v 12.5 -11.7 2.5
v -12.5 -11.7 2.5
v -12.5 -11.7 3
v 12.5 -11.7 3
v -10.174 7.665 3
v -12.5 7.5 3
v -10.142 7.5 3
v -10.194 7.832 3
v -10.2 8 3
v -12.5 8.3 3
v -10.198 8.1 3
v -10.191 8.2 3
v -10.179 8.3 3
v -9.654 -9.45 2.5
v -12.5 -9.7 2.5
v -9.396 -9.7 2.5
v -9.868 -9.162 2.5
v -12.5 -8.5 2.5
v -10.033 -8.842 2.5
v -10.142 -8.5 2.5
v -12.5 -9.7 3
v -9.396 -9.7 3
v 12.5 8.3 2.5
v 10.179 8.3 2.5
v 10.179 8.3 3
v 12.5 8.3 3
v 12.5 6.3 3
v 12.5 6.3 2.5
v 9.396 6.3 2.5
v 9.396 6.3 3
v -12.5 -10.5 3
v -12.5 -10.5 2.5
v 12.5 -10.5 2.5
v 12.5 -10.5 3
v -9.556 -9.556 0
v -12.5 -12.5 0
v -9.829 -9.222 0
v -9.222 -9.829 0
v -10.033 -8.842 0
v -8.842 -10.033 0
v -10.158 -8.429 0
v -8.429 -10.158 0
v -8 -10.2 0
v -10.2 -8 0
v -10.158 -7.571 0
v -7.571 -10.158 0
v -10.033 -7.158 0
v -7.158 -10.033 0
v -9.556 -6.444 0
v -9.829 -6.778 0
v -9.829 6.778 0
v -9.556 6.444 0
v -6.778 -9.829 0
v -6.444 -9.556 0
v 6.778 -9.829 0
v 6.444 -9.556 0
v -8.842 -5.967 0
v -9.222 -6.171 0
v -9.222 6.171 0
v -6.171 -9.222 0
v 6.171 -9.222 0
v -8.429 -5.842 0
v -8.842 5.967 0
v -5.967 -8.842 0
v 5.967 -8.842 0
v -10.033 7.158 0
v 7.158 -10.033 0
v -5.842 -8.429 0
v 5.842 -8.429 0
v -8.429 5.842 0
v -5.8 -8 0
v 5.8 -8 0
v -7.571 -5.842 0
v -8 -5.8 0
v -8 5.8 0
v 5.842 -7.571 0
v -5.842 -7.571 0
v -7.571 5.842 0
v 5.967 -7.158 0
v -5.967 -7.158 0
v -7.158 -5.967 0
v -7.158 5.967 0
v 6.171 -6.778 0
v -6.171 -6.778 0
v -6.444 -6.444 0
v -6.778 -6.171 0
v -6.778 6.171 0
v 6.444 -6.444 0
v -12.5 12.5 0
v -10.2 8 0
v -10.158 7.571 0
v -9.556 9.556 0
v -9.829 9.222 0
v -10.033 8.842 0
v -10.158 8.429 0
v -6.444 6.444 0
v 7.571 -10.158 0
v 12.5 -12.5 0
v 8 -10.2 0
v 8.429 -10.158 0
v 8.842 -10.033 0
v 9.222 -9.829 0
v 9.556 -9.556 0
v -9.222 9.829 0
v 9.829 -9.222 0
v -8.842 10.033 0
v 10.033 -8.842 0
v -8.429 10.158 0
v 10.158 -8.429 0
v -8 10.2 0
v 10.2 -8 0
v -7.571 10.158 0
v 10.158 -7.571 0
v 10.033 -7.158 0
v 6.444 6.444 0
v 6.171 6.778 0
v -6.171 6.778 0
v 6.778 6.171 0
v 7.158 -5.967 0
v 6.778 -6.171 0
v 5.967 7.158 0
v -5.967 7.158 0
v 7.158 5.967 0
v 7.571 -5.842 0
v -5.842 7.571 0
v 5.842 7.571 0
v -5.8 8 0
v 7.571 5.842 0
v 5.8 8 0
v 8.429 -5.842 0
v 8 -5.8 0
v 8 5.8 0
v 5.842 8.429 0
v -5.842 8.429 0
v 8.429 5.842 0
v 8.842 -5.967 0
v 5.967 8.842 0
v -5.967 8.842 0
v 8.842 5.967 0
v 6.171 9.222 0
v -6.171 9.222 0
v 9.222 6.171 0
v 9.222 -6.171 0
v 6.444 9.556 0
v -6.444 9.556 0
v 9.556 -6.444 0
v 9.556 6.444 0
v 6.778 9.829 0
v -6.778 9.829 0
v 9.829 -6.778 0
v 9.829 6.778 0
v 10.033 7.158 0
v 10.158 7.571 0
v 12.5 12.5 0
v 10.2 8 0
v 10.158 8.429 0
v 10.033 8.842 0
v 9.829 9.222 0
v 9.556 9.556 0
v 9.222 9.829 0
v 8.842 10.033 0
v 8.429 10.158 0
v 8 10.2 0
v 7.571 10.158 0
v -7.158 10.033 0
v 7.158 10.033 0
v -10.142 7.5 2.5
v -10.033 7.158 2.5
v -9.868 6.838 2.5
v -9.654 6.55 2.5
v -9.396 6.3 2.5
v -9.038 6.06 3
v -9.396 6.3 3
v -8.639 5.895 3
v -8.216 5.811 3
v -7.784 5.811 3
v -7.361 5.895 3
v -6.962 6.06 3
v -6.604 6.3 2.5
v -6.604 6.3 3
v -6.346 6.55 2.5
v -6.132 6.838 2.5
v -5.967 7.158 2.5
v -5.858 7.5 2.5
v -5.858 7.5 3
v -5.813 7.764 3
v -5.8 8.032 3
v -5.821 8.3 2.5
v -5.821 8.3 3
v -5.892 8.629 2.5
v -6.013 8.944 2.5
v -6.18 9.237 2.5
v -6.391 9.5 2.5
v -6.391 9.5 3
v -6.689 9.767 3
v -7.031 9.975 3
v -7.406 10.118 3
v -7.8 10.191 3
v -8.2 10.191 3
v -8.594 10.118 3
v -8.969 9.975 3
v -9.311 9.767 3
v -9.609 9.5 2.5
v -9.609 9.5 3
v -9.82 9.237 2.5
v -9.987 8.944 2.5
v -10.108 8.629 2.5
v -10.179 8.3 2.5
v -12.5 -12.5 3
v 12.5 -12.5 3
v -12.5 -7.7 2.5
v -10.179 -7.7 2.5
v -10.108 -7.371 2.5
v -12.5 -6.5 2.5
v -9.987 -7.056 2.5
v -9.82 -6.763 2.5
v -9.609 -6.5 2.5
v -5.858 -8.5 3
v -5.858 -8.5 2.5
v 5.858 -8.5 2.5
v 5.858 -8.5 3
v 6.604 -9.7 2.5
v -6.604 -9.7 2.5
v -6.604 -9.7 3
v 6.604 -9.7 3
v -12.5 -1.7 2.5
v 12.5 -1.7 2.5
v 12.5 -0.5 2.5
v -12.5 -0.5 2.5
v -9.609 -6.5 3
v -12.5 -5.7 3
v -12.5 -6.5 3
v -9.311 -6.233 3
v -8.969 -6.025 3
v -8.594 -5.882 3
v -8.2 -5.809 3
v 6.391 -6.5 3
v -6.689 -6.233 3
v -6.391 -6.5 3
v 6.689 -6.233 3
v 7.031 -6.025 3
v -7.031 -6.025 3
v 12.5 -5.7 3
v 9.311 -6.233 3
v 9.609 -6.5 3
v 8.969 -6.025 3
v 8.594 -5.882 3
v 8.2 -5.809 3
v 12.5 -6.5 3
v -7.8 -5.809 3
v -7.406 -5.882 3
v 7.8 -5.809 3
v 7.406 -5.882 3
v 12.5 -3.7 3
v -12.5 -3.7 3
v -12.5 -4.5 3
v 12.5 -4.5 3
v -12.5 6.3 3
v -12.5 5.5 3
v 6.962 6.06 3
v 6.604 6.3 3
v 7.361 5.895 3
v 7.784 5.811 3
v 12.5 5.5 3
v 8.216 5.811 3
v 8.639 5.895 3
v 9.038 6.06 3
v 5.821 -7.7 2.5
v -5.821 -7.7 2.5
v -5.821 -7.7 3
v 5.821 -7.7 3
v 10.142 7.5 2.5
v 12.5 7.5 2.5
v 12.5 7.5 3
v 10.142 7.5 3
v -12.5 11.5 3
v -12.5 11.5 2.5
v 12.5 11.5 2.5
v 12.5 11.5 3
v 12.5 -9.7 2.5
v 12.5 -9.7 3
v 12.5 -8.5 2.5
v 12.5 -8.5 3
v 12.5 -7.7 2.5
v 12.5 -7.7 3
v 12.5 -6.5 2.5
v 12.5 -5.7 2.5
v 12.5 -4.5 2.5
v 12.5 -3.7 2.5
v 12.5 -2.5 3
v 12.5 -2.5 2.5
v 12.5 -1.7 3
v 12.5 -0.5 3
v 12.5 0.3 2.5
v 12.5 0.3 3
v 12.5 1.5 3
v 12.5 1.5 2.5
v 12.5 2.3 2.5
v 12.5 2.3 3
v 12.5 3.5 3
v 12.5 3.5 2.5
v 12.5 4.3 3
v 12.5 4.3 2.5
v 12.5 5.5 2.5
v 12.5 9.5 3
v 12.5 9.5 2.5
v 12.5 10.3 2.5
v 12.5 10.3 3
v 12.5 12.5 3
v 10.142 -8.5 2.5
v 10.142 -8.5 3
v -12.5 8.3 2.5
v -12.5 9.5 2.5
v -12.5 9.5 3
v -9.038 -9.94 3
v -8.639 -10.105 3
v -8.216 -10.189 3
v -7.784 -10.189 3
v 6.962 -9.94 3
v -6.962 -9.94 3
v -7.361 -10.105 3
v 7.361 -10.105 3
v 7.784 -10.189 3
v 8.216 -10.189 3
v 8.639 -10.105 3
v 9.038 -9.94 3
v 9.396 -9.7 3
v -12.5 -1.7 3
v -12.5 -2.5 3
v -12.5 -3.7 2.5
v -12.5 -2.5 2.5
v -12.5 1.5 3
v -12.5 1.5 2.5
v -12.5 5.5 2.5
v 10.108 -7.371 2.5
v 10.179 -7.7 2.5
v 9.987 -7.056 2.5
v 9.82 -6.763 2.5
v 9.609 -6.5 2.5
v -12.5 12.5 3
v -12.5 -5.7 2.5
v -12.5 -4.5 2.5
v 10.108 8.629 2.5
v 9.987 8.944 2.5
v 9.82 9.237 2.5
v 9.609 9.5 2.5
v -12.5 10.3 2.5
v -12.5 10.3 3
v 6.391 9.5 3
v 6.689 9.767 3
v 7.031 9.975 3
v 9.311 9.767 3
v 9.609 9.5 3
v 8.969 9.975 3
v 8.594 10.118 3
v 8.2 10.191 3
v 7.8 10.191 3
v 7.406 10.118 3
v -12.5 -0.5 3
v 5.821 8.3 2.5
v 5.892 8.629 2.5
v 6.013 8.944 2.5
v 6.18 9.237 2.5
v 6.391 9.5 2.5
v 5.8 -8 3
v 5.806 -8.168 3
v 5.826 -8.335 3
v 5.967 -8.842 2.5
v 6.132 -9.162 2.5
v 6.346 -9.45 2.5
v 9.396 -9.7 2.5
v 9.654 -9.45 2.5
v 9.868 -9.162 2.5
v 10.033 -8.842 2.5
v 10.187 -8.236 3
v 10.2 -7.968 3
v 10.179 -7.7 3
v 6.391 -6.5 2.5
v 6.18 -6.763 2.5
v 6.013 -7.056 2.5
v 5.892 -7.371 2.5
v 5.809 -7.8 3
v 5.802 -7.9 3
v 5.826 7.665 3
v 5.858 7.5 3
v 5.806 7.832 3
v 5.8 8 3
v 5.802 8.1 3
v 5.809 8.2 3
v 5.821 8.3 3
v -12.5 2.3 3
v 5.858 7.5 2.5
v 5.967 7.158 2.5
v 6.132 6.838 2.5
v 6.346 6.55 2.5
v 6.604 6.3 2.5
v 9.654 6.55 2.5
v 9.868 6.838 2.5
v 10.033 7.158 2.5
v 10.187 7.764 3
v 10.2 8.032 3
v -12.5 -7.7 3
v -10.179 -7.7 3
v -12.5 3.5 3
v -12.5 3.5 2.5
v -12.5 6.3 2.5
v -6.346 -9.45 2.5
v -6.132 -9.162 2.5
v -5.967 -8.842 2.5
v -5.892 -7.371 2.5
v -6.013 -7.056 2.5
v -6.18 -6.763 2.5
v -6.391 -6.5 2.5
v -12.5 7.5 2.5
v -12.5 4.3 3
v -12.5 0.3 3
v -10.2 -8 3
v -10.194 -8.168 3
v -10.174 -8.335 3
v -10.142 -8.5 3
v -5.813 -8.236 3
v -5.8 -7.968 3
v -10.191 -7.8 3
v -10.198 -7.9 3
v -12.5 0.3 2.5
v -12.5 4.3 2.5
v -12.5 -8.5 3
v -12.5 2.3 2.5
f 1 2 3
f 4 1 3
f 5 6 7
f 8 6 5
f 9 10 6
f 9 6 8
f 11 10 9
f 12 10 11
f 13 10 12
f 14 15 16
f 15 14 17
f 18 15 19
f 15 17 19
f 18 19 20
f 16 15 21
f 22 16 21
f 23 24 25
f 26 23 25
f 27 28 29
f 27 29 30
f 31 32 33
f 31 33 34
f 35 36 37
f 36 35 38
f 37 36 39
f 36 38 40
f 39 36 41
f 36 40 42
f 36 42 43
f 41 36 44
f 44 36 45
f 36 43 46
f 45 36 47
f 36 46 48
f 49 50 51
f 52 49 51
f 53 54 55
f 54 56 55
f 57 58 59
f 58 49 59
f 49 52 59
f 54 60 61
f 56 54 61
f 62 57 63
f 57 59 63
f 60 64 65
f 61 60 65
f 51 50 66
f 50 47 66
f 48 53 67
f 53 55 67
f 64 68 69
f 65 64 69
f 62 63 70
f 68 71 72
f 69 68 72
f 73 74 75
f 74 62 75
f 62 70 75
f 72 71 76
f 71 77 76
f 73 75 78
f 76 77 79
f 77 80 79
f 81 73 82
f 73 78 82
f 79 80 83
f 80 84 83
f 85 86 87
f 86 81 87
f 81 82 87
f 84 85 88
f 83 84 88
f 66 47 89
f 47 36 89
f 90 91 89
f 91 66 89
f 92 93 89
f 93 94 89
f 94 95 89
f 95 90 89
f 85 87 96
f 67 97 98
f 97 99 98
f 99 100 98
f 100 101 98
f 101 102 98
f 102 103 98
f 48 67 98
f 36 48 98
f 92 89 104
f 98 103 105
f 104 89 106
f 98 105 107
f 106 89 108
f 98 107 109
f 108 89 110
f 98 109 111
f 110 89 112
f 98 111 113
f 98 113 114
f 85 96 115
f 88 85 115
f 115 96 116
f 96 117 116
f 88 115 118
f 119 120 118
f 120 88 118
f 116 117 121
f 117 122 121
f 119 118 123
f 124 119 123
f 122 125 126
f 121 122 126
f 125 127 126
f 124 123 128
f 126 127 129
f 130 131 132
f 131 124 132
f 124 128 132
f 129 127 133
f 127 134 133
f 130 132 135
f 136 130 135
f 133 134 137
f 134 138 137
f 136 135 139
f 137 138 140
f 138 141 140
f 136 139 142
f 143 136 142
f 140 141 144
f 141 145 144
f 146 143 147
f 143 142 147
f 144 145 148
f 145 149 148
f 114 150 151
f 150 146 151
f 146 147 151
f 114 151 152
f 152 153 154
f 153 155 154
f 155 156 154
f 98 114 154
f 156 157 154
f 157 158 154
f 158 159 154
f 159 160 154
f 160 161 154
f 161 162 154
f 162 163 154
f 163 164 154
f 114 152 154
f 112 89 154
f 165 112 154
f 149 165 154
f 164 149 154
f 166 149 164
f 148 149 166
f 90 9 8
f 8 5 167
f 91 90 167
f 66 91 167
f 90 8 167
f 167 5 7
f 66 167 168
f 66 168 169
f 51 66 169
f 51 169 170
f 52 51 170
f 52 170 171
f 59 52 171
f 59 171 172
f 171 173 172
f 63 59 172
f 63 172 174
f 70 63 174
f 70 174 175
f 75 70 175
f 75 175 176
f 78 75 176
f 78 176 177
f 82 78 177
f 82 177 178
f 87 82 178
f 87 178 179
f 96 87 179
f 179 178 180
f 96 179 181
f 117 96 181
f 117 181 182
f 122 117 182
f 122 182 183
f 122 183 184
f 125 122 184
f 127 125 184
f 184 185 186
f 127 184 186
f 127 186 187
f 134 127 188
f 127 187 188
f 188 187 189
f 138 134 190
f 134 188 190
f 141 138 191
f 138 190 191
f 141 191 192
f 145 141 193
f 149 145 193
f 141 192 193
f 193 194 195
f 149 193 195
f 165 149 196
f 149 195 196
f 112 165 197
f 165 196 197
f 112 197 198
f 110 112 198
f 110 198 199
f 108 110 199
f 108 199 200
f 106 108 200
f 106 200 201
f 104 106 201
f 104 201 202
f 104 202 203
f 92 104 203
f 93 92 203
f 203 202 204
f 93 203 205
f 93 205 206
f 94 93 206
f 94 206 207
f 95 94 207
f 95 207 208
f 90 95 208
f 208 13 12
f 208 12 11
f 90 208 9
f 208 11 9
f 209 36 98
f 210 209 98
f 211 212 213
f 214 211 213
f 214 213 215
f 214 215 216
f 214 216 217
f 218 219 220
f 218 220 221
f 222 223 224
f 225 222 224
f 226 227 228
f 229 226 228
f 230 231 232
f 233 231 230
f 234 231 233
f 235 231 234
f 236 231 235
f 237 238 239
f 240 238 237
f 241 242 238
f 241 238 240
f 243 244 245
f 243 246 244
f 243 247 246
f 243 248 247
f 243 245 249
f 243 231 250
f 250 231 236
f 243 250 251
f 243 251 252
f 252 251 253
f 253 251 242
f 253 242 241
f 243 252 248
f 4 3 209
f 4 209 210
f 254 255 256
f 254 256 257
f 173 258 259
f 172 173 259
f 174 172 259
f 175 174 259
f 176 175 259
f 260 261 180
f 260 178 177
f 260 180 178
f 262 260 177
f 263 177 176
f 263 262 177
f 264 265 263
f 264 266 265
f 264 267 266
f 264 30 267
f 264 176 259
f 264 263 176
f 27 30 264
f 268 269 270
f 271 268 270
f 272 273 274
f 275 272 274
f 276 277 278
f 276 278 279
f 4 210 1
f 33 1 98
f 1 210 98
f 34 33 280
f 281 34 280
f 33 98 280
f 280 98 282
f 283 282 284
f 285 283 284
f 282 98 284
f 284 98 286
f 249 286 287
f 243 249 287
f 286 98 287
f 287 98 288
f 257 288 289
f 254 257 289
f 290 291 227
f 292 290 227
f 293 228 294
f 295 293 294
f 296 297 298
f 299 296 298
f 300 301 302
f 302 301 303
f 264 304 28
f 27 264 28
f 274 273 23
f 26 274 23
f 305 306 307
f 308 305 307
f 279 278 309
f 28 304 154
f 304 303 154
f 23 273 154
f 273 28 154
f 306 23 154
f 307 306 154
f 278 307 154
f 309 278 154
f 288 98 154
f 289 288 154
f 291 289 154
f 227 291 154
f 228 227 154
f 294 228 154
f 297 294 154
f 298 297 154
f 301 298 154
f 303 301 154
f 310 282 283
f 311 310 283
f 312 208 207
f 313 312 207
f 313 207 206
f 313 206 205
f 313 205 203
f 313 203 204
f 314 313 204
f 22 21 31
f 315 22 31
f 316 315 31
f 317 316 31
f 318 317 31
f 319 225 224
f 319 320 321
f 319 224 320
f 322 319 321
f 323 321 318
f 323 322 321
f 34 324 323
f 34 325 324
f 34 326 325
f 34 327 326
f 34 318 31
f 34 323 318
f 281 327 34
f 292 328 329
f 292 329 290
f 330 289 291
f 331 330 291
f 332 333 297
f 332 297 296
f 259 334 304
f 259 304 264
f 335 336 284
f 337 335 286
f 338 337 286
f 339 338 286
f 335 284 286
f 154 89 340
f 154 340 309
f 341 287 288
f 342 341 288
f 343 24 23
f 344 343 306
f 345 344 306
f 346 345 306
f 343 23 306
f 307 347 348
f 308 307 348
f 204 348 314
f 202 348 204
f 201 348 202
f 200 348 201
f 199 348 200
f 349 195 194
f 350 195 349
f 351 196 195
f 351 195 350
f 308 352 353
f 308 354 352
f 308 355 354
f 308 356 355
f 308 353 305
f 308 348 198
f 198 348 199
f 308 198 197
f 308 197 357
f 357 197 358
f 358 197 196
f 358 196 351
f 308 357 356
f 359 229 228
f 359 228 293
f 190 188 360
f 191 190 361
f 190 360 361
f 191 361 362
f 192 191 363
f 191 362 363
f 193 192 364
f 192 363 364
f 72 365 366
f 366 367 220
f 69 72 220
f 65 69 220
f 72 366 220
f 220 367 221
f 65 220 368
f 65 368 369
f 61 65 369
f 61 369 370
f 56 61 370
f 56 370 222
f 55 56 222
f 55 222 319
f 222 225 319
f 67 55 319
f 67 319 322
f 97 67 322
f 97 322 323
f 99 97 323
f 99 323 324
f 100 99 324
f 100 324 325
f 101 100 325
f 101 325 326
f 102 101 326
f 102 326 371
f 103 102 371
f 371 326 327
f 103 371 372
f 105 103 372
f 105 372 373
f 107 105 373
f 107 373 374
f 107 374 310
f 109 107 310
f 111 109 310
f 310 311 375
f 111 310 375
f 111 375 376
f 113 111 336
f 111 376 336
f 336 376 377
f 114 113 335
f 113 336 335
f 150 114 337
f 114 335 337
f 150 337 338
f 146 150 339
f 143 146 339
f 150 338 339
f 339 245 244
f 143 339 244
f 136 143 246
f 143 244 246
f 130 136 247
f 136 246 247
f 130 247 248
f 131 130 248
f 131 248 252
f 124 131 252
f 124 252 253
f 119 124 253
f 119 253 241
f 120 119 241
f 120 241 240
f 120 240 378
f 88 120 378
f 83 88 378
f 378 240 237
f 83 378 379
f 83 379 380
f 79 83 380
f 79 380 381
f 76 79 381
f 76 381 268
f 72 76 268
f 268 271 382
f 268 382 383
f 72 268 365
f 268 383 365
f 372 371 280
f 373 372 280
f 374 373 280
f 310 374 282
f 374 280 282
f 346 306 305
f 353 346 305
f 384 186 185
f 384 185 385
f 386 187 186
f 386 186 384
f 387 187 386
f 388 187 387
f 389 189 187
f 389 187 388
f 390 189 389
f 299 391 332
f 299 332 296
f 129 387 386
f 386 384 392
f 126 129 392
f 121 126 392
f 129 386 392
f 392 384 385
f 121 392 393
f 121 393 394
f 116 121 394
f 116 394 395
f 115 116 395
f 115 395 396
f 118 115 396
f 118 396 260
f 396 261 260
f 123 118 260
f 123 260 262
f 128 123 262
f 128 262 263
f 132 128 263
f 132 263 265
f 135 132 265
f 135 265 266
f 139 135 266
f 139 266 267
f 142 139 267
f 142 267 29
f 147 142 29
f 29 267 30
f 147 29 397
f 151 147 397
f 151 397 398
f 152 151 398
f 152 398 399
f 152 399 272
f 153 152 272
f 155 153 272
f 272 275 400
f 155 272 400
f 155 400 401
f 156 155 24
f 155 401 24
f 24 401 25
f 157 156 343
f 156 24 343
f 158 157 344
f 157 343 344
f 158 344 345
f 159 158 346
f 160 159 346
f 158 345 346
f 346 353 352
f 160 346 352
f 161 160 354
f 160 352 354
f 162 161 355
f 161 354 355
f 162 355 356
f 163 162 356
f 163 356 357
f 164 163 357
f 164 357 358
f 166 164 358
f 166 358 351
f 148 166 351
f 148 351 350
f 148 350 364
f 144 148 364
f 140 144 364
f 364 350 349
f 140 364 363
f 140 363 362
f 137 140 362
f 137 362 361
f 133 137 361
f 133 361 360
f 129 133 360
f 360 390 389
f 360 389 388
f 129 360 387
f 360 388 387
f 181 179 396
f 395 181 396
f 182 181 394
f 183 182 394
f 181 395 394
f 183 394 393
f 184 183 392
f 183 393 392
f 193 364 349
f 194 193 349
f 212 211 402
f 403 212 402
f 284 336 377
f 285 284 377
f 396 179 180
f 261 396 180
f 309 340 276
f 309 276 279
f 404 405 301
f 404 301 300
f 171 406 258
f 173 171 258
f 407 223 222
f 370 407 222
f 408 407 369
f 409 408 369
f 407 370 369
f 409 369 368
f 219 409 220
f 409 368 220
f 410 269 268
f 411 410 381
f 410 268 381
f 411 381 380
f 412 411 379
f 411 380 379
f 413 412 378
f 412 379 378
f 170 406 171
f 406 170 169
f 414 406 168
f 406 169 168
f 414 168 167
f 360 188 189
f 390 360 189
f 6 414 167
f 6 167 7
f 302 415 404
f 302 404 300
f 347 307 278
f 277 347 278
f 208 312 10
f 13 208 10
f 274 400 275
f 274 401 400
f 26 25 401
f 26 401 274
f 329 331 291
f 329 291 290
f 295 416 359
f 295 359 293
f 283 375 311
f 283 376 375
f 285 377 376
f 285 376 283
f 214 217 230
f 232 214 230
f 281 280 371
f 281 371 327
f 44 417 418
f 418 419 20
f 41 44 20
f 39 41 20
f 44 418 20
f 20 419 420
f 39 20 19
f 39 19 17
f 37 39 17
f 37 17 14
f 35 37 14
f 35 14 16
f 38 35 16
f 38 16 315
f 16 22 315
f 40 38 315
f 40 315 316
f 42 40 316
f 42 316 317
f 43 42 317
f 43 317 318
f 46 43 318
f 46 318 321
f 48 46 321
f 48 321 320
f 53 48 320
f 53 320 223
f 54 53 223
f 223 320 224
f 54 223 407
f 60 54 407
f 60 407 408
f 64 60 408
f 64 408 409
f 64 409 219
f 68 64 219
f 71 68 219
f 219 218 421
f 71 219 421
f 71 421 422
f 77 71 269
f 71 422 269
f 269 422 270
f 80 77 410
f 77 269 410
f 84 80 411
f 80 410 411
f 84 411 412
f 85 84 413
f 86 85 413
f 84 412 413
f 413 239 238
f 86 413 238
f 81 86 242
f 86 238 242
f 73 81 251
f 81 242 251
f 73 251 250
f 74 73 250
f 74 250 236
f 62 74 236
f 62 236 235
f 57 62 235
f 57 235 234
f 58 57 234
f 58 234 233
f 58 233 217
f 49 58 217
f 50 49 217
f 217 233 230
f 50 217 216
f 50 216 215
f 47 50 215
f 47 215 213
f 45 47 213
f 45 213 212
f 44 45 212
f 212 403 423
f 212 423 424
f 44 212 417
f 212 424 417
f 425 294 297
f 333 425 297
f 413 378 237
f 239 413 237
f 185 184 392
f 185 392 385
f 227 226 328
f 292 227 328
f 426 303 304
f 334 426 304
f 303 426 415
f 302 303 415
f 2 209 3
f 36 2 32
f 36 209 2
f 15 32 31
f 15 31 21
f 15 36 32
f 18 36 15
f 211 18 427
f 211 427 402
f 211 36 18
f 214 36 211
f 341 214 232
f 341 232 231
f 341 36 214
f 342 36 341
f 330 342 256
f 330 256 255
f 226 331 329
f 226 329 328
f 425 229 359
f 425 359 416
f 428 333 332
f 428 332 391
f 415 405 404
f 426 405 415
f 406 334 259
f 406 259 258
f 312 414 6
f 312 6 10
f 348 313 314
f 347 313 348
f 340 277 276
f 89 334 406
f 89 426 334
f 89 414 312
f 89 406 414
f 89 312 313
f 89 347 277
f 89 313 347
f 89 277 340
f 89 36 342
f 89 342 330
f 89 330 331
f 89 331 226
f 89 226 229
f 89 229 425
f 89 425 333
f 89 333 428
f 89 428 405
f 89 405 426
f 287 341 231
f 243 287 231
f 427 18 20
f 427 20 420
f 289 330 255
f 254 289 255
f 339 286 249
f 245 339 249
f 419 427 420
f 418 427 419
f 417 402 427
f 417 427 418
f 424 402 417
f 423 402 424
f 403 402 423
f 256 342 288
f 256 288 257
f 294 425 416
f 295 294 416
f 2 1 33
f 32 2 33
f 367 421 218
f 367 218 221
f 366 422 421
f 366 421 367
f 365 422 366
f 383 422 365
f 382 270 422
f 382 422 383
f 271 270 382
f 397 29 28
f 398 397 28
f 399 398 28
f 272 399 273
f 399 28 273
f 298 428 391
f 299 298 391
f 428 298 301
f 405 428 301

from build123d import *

# Parameters (mm, degrees)
F0_W     = 25
F0_H     = 25
F1_DEPTH = 3
F2_D     = 4.4
F3_W     = 1.2
F3_H     = 0.5
F4_DEPTH = 25.001


with BuildPart() as f1:
    # F0 (on Top) → F1 (new body)
    with BuildSketch(Plane.XY):
        Rectangle(F0_W, F0_H)
    extrude(amount=F1_DEPTH)

    # F2 (through all)
    with Locations(Plane(origin=(0, 0, 0), x_dir=(1, 0, 0), z_dir=(0, 0, -1))):
        with Locations((-8, -8), (8, -8), (8, 8), (-8, 8)):
            Hole(F2_D / 2)

    # F3 (on face) → F4 (cut, through all)
    with BuildSketch(Plane.YZ.offset(12.5)):
        with Locations((-11.1, 2.75)):
            Rectangle(F3_W, F3_H)
        with Locations((-9.1, 2.75)):
            Rectangle(F3_W, F3_H)
        with Locations((-7.1, 2.75)):
            Rectangle(F3_W, F3_H)
        with Locations((-5.1, 2.75)):
            Rectangle(F3_W, F3_H)
        with Locations((-3.1, 2.75)):
            Rectangle(F3_W, F3_H)
        with Locations((-1.1, 2.75)):
            Rectangle(F3_W, F3_H)
        with Locations((0.9, 2.75)):
            Rectangle(F3_W, F3_H)
        with Locations((2.9, 2.75)):
            Rectangle(F3_W, F3_H)
        with Locations((4.9, 2.75)):
            Rectangle(F3_W, F3_H)
        with Locations((6.9, 2.75)):
            Rectangle(F3_W, F3_H)
        with Locations((8.9, 2.75)):
            Rectangle(F3_W, F3_H)
        with Locations((10.9, 2.75)):
            Rectangle(F3_W, F3_H)
    extrude(amount=-F4_DEPTH, mode=Mode.SUBTRACT)


solid = f1.part
